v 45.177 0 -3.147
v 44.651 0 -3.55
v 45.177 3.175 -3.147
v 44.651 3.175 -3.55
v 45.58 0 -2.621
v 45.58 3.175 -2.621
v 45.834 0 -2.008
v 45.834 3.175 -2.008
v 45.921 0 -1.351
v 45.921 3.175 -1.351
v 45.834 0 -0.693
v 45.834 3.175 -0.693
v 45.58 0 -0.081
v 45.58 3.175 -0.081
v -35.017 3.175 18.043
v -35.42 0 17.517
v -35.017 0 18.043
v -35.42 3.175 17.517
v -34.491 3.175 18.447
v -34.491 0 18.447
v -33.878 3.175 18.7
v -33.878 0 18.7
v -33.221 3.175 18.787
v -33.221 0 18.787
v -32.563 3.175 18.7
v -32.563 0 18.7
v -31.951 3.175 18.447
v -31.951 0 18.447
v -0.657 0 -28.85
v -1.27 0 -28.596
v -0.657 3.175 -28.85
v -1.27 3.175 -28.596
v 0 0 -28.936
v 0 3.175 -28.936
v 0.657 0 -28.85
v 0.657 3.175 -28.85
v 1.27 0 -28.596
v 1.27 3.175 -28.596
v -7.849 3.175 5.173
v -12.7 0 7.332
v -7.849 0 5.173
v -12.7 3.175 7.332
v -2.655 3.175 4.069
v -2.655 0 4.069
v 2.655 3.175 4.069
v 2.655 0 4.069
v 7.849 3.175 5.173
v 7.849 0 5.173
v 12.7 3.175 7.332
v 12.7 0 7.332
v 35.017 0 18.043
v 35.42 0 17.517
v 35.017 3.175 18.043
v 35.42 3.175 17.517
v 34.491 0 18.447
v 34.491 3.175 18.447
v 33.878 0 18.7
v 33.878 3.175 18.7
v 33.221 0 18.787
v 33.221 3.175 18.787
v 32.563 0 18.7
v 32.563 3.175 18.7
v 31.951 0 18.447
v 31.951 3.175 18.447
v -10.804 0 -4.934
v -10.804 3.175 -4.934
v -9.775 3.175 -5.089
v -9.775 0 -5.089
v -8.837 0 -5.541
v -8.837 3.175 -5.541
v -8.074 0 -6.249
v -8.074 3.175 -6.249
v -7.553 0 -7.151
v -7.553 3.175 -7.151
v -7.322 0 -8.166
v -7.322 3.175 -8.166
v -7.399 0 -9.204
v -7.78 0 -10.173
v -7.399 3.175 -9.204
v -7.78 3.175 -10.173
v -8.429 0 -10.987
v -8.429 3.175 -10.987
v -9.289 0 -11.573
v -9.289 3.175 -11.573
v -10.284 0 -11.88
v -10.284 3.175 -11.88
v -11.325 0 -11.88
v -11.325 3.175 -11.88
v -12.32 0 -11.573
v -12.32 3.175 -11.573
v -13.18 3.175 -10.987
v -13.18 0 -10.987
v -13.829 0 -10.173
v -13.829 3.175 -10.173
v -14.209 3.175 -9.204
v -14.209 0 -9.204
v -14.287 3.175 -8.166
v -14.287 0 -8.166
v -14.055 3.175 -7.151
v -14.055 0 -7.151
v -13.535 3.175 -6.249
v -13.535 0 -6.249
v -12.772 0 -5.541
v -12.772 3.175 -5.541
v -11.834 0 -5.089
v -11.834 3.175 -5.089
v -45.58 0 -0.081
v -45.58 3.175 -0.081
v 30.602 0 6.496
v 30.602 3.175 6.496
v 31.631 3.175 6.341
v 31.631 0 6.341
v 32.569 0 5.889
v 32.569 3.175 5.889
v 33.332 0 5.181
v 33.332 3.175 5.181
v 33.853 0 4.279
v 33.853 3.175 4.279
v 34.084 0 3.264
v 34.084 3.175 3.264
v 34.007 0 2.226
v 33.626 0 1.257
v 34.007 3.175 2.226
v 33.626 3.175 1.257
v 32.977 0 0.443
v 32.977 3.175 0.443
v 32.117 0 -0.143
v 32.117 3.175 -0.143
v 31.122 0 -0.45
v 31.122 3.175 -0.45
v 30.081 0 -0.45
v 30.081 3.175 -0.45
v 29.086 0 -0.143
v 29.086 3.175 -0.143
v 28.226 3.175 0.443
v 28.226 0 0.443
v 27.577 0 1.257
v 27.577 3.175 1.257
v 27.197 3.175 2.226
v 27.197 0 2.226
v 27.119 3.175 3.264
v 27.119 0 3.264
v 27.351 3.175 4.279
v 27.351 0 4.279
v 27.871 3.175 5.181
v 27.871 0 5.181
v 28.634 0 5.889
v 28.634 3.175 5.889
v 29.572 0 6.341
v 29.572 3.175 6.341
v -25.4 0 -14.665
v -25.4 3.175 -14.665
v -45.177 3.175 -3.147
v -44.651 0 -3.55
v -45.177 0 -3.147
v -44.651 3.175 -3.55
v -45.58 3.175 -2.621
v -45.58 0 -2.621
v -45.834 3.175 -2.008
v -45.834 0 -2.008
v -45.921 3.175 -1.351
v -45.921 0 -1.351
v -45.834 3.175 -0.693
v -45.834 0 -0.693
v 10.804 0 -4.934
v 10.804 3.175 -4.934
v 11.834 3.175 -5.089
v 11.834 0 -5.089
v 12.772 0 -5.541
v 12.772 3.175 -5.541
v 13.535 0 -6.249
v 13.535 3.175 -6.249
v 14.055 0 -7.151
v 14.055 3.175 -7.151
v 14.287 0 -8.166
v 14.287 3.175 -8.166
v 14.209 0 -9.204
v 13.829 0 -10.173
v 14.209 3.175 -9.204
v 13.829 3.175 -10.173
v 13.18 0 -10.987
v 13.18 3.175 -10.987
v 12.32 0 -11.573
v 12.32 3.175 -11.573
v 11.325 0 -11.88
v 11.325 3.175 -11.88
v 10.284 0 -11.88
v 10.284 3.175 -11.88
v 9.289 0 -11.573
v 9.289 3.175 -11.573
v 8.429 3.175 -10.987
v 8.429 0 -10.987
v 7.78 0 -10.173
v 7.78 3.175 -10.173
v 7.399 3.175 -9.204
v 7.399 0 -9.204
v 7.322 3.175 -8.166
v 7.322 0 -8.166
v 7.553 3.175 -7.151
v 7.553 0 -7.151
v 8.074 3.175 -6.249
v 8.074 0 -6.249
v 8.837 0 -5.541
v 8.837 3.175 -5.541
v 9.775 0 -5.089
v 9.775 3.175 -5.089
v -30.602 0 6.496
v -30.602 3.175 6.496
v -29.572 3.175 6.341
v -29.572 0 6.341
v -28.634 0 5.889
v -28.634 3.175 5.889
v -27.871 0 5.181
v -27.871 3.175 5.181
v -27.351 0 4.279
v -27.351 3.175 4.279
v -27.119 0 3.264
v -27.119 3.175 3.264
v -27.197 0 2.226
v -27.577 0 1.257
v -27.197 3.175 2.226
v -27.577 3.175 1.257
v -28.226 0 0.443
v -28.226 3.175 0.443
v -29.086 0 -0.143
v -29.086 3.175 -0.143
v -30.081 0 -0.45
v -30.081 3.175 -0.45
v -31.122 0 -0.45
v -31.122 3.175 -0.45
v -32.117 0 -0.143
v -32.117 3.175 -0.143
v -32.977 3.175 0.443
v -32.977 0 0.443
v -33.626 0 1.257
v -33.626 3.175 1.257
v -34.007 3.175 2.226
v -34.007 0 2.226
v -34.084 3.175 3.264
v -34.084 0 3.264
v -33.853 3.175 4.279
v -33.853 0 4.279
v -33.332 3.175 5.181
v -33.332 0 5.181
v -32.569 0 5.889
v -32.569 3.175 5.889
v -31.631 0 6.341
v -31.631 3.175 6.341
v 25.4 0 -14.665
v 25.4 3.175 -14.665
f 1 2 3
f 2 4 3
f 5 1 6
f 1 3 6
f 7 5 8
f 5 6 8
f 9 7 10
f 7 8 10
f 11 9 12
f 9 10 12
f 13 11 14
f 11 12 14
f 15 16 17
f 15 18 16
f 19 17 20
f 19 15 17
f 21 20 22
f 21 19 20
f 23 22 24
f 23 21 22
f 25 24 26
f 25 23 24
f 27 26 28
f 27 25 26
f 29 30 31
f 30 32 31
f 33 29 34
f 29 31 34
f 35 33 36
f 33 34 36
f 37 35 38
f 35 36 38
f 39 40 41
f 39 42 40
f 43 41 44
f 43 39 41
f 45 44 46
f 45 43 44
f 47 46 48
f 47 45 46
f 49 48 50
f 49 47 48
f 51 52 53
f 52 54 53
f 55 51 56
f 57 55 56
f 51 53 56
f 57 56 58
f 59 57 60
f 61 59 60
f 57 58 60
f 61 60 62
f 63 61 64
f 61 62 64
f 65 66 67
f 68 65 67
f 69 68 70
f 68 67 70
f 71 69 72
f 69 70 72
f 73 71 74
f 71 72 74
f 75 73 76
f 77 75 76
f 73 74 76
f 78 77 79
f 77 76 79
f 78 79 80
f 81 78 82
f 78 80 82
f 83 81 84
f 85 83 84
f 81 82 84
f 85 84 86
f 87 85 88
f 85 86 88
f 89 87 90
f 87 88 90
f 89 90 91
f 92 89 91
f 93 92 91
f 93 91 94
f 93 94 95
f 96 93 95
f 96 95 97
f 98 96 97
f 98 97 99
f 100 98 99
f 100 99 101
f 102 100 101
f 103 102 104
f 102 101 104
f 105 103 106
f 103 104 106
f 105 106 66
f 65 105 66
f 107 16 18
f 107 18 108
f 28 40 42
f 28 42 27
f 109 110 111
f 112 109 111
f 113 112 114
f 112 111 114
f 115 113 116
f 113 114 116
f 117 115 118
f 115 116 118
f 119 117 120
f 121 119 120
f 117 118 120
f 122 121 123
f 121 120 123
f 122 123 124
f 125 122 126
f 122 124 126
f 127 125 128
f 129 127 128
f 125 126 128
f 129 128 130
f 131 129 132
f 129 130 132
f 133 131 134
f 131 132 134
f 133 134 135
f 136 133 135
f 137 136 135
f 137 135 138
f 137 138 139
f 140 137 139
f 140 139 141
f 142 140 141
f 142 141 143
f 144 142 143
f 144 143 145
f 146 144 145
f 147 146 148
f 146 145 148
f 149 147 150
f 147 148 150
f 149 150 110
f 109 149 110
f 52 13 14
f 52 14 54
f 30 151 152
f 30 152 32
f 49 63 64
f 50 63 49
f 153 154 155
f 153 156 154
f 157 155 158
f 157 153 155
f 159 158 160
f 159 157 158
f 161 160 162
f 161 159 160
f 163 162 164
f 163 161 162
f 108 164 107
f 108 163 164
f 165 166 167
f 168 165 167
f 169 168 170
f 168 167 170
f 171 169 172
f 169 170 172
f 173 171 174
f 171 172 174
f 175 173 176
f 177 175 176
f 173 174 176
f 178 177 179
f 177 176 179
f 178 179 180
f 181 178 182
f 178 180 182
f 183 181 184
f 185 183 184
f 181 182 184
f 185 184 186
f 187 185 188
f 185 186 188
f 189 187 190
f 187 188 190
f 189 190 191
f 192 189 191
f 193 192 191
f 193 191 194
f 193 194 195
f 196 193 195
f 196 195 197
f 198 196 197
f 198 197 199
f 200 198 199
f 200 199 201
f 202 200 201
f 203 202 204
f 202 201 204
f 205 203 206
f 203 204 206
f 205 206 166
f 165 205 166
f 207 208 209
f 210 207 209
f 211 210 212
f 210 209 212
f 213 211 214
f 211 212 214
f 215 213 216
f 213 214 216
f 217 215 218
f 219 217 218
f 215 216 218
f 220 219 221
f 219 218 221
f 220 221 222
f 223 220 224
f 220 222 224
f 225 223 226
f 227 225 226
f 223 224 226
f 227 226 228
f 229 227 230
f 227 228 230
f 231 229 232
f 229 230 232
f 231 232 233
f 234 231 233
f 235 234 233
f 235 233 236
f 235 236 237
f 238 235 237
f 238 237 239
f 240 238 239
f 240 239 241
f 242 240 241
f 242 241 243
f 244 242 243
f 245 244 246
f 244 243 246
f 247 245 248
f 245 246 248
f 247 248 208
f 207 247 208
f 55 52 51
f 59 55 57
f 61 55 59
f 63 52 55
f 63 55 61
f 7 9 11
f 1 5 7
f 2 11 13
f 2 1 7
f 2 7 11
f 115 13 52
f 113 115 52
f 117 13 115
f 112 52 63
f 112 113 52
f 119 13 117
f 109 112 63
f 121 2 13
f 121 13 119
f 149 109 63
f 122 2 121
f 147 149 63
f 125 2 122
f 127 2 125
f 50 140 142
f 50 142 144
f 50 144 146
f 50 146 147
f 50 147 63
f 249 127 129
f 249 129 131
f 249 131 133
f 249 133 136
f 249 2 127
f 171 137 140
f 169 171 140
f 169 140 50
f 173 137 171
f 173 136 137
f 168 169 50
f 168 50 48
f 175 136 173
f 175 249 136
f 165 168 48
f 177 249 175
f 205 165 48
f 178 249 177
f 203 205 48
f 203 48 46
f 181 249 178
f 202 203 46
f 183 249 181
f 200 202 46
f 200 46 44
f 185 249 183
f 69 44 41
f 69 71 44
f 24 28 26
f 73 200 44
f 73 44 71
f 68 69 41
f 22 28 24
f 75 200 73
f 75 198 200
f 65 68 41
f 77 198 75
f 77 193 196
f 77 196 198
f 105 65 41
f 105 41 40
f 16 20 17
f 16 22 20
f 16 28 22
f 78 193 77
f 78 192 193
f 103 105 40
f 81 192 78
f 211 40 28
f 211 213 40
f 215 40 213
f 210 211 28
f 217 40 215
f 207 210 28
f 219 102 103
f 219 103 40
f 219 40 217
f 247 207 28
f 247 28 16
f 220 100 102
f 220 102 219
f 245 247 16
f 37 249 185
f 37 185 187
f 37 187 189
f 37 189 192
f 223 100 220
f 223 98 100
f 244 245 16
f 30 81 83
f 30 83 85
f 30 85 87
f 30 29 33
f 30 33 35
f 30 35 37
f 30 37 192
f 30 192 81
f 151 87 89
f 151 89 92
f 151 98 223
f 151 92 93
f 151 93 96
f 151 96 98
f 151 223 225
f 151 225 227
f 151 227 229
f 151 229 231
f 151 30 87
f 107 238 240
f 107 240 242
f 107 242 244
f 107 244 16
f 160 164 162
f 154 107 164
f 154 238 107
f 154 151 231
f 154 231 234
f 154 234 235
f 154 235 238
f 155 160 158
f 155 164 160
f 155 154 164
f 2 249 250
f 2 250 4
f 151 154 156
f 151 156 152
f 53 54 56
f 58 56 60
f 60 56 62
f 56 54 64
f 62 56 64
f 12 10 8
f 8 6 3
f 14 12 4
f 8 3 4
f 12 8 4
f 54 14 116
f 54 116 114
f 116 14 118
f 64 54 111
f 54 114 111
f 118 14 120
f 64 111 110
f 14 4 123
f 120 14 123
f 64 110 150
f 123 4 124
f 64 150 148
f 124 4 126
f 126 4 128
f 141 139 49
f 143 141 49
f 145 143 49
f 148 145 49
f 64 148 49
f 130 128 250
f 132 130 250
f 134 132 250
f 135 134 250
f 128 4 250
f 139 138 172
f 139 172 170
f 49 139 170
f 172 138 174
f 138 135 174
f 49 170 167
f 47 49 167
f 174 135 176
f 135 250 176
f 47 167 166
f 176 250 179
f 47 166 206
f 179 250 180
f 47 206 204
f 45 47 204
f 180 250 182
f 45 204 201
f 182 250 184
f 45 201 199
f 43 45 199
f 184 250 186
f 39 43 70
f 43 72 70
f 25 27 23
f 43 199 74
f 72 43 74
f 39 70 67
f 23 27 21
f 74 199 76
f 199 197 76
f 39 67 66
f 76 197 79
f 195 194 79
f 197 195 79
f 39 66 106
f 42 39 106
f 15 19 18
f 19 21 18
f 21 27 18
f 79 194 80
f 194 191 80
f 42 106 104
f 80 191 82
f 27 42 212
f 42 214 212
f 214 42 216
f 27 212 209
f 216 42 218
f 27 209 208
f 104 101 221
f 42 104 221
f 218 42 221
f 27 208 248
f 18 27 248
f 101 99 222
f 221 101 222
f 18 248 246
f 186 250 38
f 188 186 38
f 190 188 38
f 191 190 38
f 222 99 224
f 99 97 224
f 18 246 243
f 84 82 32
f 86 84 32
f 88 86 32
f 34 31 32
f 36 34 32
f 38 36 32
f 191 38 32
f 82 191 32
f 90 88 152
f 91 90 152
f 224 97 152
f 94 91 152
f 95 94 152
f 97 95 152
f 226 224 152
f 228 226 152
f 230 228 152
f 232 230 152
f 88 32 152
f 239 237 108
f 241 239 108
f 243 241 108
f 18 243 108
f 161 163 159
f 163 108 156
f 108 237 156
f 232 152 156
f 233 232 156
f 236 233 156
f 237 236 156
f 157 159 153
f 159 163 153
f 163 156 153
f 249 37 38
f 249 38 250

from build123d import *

# Parameters (mm, degrees)
BOSS_EXTRUDE1_DEPTH = 3.175
SKETCH2_R           = 3.4925
CUT_EXTRUDE2_DEPTH  = 3.175
LPATTERN5_COUNT     = 2
LPATTERN5_PITCH     = 22.86
SKETCH7_R           = 3.4925
CUT_EXTRUDE3_DEPTH  = 3.175
LPATTERN6_COUNT     = 2
LPATTERN6_PITCH     = 22.86
FILLET1_R           = 2.54
FILLET2_R           = 25.4


with BuildPart() as part:
    # Sketch1 → Boss-Extrude1 (new body)
    with BuildSketch(Plane(origin=(0, 0, 0), x_dir=(1, 0, 0), z_dir=(0, 1, 0))):
        Polygon((-25.4, 14.664696837), (0, 29.329393675), (25.4, 14.664696837), (46.85041276, 2.280295256), (34.15041276, -19.71675), (0, 0), (-34.15041276, -19.71675), (-46.85041276, 2.280295256), align=None)
    extrude(amount=BOSS_EXTRUDE1_DEPTH)

    # Sketch2 → Cut-Extrude2 (cut)
    with BuildSketch(Plane(origin=(0, 3.175, 0), x_dir=(1, 0, 0), z_dir=(0, 1, 0))):
        with Locations((-30.601742395, -3.003227372)):
            Circle(SKETCH2_R)
    cut_extrude2 = extrude(amount=-CUT_EXTRUDE2_DEPTH, mode=Mode.SUBTRACT)

    # LPattern5: Cut-Extrude2 ×2
    with Locations(*[Vector(0.8660254037844386, 0, -0.5000000000000003) * (i * LPATTERN5_PITCH) for i in range(1, LPATTERN5_COUNT)]):
        add(cut_extrude2, mode=Mode.SUBTRACT)

    # Sketch7 → Cut-Extrude3 (cut)
    with BuildSketch(Plane(origin=(0, 3.175, 0), x_dir=(1, 0, 0), z_dir=(0, 1, 0))):
        with Locations((30.601742395, -3.003227372)):
            Circle(SKETCH7_R)
    cut_extrude3 = extrude(amount=-CUT_EXTRUDE3_DEPTH, mode=Mode.SUBTRACT)

    # LPattern6: Cut-Extrude3 ×2
    with Locations(*[Vector(-0.8660254037844375, 0, -0.5000000000000022) * (i * LPATTERN6_PITCH) for i in range(1, LPATTERN6_COUNT)]):
        add(cut_extrude3, mode=Mode.SUBTRACT)

    # Fillet1
    fillet1_edges = [part.edges().sort_by_distance(p)[0] for p in [
        (0, 1.5875, -29.329393675),
        (46.85041276, 1.5875, -2.280295256),
        (34.15041276, 1.5875, 19.71675),
        (-46.85041276, 1.5875, -2.280295256),
        (-34.15041276, 1.5875, 19.71675),
    ]]
    fillet(fillet1_edges, radius=FILLET1_R)

    # Fillet2
    fillet2_edges = [part.edges().sort_by_distance(p)[0] for p in [
        (0, 1.5875, 0),
    ]]
    fillet(fillet2_edges, radius=FILLET2_R)


solid = part.part
